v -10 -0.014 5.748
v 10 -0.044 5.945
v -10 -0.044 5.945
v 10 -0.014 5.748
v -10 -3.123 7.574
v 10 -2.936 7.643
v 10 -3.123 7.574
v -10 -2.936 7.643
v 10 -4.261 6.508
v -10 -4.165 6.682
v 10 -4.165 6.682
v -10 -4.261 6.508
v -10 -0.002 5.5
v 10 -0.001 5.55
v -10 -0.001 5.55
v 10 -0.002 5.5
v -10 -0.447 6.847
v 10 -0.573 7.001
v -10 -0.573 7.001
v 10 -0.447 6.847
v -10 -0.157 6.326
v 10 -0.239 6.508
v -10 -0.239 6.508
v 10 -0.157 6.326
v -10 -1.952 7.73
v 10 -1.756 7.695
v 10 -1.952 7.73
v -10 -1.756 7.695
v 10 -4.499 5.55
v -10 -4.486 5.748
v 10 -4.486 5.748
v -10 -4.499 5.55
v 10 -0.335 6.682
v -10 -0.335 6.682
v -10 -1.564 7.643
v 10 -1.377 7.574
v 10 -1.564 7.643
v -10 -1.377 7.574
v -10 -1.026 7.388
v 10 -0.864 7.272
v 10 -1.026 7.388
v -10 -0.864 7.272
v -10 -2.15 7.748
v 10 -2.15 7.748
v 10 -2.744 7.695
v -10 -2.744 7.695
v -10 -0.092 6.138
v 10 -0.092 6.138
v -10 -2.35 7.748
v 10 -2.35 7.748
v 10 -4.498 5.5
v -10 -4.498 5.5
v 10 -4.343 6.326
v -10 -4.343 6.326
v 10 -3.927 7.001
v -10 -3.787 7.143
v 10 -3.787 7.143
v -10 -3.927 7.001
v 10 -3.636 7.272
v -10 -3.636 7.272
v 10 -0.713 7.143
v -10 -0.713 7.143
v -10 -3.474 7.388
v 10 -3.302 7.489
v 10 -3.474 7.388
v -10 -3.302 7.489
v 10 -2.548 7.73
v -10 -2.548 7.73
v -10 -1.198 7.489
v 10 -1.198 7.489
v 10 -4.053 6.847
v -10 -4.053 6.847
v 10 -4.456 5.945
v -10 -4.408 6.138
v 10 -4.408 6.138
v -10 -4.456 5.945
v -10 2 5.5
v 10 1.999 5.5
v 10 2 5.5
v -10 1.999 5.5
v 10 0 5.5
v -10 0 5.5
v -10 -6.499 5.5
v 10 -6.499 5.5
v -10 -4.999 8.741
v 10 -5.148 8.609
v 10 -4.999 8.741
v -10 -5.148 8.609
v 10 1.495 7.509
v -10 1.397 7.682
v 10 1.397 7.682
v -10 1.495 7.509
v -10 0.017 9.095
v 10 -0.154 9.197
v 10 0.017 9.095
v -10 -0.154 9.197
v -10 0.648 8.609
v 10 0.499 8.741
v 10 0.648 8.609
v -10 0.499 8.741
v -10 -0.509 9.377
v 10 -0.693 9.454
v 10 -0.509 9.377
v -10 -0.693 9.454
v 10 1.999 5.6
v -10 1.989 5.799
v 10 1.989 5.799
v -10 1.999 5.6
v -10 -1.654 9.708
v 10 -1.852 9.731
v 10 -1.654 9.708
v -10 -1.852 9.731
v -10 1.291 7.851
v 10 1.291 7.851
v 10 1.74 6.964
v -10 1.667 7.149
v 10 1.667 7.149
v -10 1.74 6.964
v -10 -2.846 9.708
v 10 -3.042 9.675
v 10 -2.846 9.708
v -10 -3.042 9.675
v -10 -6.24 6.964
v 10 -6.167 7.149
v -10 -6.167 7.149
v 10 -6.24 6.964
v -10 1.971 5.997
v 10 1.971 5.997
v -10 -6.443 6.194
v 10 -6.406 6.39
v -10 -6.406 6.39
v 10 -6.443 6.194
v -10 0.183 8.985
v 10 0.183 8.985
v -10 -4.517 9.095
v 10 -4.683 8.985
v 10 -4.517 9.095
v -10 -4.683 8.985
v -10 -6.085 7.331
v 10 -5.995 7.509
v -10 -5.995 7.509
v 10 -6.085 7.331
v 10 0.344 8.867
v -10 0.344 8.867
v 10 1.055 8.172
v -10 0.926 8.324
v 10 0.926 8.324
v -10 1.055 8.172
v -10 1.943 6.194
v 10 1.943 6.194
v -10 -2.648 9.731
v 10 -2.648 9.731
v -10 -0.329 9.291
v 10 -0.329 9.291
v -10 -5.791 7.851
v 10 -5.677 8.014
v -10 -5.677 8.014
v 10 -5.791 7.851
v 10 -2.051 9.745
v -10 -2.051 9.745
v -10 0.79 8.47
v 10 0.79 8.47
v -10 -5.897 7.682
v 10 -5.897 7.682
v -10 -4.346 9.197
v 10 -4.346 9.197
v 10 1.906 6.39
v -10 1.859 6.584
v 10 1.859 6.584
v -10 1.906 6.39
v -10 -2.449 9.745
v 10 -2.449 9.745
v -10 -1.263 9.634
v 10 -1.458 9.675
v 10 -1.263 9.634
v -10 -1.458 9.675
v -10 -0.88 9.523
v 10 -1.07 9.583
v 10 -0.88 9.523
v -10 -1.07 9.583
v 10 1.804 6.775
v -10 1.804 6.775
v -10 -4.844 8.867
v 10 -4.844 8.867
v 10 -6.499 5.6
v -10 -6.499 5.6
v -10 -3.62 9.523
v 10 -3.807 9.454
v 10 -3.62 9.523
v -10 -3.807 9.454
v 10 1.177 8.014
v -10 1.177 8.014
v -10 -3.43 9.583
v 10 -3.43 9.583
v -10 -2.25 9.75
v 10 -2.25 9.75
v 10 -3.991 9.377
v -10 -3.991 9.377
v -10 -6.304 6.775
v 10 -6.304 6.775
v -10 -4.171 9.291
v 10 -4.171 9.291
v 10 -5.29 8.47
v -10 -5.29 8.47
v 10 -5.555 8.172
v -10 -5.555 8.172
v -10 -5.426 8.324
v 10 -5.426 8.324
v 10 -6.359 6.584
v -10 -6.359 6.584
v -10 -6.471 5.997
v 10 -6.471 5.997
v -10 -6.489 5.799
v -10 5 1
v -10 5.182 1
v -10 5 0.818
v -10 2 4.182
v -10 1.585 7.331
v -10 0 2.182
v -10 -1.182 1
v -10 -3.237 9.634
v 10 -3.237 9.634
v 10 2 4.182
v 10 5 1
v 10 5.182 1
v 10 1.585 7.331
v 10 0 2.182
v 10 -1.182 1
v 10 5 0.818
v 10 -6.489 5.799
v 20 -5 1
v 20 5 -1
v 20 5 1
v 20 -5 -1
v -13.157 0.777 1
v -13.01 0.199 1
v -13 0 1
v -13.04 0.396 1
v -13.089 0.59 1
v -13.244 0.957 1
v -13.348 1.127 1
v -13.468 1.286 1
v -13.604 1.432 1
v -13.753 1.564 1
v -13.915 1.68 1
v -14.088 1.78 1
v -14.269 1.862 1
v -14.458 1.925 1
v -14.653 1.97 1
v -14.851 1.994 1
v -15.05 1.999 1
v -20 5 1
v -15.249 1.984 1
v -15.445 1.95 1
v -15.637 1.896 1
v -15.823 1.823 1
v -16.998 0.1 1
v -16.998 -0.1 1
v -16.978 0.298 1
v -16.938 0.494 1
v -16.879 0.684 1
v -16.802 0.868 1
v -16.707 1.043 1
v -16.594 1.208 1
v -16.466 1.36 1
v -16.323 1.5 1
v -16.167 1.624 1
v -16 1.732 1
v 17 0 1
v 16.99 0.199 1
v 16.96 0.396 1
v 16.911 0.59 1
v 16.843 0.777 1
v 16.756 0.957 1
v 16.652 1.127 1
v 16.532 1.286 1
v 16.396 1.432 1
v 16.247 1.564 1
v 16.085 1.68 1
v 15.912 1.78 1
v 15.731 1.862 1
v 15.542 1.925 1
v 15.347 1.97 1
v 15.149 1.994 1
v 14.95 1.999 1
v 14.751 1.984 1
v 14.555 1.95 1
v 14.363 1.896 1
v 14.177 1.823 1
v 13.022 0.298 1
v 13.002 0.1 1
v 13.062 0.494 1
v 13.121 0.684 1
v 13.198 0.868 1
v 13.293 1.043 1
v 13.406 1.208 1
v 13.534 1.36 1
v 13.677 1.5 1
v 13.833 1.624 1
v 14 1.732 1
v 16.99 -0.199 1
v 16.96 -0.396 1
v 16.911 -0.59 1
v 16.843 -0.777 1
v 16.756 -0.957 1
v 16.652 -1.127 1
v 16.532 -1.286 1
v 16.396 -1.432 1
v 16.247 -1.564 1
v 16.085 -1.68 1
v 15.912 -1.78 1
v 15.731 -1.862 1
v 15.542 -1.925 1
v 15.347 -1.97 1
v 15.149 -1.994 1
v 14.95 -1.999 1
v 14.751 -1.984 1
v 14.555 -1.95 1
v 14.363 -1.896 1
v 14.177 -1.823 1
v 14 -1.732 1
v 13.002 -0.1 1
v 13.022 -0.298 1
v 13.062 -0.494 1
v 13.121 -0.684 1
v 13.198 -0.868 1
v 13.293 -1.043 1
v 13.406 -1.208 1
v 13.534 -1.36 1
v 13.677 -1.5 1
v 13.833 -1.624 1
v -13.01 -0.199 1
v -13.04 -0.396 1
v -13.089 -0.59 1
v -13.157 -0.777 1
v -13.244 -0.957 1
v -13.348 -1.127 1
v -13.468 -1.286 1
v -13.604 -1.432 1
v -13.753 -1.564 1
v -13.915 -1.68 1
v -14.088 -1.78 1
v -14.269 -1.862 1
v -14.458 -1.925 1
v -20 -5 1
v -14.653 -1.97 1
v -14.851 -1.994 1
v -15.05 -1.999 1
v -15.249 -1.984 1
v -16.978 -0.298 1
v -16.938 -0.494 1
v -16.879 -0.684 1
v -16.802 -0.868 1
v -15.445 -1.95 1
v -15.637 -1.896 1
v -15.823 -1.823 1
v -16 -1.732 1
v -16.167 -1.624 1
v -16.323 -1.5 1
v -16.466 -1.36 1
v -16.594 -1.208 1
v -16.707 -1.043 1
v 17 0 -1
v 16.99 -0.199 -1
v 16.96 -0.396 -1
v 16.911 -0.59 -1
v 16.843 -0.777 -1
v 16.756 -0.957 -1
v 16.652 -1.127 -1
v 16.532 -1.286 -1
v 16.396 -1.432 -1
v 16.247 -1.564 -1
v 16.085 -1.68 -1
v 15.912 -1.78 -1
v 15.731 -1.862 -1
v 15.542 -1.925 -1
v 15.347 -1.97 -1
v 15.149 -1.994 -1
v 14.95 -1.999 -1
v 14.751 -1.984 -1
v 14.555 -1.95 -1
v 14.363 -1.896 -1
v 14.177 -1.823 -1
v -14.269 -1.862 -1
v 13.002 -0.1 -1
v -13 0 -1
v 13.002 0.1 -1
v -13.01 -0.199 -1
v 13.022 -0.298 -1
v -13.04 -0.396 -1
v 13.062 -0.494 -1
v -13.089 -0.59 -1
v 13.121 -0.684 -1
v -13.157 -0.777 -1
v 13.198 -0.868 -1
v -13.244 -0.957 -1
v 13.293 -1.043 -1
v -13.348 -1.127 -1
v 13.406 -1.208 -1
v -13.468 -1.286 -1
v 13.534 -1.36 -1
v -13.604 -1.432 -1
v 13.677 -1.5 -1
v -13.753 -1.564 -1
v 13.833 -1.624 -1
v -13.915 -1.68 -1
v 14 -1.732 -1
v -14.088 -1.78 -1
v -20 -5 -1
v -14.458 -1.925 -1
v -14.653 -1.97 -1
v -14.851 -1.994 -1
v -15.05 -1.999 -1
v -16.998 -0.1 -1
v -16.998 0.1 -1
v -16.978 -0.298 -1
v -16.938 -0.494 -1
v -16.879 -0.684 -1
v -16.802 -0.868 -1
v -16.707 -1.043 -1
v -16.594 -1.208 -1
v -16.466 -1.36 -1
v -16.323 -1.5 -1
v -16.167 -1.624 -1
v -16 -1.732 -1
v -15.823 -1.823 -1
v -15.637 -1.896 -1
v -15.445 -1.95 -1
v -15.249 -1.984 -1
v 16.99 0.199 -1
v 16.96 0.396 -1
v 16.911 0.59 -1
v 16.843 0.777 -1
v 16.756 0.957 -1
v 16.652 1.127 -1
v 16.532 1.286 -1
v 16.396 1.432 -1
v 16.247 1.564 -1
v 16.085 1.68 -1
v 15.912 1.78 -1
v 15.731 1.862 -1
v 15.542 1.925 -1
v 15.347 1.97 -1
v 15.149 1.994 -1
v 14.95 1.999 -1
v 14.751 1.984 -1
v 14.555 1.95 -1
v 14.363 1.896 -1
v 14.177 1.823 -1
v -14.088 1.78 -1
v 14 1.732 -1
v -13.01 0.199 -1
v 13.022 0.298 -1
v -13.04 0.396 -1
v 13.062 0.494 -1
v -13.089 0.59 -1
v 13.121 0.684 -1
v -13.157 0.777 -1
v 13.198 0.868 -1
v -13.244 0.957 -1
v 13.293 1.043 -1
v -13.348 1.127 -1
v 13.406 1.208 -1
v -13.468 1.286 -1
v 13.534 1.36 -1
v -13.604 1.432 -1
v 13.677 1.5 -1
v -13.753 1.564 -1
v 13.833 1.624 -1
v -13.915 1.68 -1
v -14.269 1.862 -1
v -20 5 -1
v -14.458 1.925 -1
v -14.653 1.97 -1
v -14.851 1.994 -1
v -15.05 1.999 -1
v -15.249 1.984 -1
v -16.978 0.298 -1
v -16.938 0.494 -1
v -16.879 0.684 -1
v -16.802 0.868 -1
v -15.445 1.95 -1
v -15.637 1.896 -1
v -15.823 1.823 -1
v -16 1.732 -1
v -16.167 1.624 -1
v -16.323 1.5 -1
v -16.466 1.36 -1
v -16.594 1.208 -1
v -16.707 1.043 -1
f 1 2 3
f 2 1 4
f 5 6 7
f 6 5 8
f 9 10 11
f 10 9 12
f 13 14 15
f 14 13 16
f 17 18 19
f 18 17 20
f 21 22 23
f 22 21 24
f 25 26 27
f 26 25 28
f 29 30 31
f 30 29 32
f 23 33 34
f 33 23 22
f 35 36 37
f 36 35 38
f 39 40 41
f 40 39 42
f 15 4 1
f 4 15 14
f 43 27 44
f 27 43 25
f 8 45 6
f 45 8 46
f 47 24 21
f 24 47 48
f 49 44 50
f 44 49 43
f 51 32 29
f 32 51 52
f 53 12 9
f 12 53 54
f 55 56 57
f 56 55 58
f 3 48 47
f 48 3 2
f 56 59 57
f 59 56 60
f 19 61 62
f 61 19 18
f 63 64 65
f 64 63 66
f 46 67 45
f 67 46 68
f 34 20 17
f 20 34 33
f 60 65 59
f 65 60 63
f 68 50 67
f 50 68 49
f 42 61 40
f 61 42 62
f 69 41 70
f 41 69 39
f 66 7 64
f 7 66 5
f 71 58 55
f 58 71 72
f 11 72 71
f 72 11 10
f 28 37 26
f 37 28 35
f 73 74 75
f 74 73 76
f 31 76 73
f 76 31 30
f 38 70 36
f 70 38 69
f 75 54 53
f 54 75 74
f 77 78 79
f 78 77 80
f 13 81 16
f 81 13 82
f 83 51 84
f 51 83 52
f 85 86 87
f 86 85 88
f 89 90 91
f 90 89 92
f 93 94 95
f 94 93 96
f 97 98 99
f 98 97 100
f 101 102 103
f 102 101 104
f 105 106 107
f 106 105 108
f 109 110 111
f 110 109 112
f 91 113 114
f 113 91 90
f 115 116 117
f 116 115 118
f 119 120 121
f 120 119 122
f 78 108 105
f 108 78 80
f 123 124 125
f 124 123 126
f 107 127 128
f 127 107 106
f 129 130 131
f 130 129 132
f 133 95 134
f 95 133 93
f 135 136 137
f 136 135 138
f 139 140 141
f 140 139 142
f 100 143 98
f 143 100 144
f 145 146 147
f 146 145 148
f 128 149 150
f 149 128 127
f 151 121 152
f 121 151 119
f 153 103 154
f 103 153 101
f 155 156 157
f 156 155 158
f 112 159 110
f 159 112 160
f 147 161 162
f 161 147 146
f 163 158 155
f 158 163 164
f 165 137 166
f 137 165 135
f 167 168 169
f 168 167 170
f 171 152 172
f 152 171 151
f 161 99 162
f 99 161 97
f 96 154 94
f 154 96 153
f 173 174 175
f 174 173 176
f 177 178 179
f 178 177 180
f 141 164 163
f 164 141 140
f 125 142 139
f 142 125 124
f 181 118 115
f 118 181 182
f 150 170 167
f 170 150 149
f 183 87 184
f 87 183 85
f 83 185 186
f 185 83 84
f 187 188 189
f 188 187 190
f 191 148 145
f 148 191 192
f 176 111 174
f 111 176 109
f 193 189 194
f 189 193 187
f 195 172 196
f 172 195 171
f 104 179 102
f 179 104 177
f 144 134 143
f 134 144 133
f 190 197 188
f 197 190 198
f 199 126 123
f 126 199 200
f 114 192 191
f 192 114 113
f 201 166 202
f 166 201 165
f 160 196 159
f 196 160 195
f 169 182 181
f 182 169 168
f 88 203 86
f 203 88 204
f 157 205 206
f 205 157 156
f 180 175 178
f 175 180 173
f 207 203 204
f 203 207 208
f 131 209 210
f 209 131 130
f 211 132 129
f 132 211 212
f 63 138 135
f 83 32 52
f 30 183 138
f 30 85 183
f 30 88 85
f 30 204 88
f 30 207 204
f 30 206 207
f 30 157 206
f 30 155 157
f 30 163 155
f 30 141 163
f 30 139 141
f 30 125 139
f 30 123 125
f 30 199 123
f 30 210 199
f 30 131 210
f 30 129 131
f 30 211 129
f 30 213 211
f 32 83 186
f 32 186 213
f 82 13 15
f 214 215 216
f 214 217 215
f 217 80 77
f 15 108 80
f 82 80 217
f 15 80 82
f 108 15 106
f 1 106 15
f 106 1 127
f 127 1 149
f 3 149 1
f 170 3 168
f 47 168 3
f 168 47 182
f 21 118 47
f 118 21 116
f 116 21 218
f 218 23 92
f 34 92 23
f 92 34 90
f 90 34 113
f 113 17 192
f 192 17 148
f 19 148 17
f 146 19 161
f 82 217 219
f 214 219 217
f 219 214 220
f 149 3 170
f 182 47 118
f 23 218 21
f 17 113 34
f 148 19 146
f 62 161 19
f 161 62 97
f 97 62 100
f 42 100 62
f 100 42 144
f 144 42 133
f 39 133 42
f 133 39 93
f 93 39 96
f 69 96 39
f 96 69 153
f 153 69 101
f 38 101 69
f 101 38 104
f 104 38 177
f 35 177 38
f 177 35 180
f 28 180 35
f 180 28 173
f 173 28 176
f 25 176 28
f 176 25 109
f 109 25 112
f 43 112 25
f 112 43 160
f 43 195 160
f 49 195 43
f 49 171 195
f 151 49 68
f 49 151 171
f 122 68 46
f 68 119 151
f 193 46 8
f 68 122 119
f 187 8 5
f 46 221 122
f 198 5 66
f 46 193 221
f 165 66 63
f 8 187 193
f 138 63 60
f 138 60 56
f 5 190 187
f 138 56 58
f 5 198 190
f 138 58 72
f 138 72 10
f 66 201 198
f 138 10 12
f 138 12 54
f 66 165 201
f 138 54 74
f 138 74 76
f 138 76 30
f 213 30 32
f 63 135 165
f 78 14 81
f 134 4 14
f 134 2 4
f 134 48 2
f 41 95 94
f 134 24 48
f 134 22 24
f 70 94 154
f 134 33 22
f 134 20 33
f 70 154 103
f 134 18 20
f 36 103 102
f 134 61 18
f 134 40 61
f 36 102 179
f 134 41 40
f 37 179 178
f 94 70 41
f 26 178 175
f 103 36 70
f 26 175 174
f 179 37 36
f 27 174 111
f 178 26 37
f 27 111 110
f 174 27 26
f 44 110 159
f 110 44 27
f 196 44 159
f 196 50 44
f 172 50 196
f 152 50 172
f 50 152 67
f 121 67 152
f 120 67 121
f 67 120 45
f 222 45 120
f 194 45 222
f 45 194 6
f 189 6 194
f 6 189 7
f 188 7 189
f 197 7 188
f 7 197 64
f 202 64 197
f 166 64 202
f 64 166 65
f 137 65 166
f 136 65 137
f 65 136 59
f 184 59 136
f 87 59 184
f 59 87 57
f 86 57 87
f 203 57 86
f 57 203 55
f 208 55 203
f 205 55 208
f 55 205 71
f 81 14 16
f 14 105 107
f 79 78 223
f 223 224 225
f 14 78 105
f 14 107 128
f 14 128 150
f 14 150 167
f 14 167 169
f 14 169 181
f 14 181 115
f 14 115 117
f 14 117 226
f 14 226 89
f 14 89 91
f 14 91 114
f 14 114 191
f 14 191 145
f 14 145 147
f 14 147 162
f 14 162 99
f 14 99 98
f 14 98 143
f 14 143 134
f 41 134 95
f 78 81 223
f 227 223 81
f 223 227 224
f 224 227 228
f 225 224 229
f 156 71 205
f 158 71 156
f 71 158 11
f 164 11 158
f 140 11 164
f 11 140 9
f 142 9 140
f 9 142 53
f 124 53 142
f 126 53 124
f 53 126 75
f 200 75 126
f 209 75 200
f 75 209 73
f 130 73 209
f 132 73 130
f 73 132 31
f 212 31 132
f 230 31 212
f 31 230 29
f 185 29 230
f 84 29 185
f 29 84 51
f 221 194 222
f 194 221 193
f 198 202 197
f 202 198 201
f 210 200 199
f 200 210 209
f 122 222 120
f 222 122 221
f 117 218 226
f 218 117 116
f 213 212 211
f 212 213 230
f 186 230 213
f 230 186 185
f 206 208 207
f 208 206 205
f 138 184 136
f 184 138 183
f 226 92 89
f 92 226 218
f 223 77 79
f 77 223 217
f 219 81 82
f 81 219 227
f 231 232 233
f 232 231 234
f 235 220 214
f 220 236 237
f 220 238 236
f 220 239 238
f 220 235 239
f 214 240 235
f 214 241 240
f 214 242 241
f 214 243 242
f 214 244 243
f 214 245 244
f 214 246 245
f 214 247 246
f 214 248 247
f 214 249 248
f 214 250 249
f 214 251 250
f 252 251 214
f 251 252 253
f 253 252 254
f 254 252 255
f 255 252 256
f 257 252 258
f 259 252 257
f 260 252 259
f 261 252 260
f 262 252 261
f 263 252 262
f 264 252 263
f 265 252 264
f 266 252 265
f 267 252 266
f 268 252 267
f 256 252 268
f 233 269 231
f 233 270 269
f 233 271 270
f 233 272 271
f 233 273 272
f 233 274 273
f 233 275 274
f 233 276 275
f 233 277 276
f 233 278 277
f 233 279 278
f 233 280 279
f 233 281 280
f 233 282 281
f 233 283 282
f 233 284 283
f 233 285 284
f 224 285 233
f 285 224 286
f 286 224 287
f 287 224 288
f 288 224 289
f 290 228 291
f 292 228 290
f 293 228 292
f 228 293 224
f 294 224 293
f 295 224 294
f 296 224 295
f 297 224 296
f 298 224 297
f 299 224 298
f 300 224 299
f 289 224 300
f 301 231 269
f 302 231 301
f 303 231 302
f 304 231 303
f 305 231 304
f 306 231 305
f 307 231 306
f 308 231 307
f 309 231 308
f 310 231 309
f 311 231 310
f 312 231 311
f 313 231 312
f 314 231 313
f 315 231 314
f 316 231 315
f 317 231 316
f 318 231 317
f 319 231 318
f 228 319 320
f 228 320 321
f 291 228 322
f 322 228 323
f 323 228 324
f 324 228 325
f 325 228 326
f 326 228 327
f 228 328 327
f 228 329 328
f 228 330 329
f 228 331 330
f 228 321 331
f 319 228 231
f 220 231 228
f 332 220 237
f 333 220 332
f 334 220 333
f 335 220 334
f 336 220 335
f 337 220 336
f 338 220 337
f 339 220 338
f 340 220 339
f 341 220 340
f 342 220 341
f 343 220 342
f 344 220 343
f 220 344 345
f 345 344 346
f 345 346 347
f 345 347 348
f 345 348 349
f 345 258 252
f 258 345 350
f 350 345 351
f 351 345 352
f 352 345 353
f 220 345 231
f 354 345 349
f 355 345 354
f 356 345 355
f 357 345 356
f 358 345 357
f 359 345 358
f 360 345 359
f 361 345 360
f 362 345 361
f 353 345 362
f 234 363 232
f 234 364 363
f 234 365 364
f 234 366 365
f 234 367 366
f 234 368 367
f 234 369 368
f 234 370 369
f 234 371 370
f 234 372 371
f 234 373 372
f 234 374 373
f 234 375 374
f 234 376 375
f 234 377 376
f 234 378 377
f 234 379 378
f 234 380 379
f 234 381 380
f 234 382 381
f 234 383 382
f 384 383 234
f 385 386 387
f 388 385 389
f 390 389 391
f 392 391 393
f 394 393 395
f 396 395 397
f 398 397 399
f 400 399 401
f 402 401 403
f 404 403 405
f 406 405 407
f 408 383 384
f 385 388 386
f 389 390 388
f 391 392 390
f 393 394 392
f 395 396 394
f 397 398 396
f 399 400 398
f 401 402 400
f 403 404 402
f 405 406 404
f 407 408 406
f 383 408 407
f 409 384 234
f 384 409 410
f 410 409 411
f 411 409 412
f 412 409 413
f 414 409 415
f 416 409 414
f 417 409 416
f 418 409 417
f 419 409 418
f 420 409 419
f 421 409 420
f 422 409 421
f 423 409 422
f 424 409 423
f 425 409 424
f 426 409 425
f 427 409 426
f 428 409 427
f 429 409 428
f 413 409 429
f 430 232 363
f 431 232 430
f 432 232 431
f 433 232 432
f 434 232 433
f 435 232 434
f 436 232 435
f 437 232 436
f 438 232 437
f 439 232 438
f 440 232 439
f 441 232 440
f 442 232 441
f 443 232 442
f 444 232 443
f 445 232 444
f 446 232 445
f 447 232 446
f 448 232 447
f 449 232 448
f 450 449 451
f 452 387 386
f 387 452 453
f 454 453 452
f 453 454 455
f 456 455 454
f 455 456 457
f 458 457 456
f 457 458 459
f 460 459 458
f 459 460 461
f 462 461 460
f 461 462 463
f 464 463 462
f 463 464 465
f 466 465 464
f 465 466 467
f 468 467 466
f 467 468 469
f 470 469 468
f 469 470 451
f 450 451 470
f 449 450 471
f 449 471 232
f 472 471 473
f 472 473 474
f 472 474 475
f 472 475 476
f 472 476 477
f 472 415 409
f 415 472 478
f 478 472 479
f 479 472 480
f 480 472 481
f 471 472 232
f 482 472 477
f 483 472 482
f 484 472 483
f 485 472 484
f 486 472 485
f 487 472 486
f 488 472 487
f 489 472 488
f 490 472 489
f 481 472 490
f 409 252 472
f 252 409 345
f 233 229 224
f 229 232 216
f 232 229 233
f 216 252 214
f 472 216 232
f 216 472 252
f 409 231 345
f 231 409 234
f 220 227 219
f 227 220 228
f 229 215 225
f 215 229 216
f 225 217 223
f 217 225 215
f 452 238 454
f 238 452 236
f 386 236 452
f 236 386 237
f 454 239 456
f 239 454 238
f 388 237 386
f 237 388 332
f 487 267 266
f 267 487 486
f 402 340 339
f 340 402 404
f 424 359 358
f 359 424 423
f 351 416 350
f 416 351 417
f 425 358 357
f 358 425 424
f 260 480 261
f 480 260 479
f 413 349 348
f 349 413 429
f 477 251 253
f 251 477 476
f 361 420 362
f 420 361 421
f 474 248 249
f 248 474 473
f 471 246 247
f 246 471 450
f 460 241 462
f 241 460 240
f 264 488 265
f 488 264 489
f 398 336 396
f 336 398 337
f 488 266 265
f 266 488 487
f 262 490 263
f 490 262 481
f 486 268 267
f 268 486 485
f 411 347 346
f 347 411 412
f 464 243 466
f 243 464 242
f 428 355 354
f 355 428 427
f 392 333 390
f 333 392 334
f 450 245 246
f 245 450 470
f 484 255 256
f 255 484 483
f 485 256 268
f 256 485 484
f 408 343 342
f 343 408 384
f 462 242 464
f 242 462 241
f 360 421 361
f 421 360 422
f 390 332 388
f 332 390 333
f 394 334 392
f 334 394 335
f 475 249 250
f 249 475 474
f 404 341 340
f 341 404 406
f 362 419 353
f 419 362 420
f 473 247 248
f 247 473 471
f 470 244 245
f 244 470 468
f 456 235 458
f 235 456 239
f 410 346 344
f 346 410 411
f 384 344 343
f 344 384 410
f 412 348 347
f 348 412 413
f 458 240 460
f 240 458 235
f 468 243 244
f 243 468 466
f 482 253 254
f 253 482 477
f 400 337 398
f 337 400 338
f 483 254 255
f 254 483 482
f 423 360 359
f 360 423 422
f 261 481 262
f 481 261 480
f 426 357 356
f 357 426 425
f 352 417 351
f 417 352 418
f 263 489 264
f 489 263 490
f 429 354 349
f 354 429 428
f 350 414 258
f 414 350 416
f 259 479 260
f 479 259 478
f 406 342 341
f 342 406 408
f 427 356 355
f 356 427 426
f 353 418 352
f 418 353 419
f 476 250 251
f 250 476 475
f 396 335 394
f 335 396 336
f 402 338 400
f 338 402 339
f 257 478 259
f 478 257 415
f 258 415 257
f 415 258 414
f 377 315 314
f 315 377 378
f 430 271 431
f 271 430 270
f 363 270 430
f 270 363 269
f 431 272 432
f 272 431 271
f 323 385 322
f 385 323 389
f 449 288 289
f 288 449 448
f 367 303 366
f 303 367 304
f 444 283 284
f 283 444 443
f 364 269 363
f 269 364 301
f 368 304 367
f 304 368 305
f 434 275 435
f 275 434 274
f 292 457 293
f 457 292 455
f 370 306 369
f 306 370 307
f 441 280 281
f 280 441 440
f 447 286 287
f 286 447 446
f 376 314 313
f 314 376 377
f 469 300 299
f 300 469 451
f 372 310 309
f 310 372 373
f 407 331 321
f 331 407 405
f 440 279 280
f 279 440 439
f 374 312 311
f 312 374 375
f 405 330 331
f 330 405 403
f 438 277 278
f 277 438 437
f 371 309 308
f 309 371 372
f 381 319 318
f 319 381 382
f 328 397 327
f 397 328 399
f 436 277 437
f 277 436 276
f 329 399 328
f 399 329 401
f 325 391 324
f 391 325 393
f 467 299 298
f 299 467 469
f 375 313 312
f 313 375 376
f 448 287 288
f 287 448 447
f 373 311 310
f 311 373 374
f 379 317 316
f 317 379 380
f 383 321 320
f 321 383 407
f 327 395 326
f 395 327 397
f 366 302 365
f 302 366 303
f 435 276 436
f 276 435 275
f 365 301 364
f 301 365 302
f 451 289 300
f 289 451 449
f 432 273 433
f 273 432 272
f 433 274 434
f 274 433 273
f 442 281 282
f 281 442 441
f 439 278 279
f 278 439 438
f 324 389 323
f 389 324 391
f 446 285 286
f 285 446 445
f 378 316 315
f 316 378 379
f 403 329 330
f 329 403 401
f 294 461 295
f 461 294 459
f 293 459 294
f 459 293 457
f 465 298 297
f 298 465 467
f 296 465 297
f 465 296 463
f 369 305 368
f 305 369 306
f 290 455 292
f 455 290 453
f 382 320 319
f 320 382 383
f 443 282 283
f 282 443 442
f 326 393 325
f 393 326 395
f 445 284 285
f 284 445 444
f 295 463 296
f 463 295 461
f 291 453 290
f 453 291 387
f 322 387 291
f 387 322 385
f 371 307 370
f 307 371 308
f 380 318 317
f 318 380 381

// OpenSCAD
diameter=4.5;
width=20;
thickness=2;
height=10;
hole=4;
space=3;
$fa=1;
$fs=.2;

difference() {
	union() {
		cube([width+2*(hole+2*space), height, thickness], center=true);
		translate([-width/2, 0, thickness/2]) {
			cube([width, thickness, diameter]);
			translate([0, -diameter/2, diameter]) rotate([0, 90, 0]) difference() {
				cylinder(d=diameter+2*thickness, h=width);
				translate([0, 0, -.5]) {
					cylinder(d=diameter, h=width+1);
					translate([0, -diameter, 0]) cube([diameter, 2*diameter, width+1]);
				}
			}
		}
		translate([0, thickness, thickness/2]) rotate([45, 0, 0]) cube([width, diameter, diameter], center=true);
	}
	translate([-width/2-space-hole/2, 0, 0]) cylinder(d=hole, h=thickness*2, center=true);
	translate([width/2+space+hole/2, 0, 0]) cylinder(d=hole, h=thickness*2, center=true);
	translate([0, 0, -2*thickness])    cube([width+2*(hole+2*space), height, 3*thickness], center=true);
}
